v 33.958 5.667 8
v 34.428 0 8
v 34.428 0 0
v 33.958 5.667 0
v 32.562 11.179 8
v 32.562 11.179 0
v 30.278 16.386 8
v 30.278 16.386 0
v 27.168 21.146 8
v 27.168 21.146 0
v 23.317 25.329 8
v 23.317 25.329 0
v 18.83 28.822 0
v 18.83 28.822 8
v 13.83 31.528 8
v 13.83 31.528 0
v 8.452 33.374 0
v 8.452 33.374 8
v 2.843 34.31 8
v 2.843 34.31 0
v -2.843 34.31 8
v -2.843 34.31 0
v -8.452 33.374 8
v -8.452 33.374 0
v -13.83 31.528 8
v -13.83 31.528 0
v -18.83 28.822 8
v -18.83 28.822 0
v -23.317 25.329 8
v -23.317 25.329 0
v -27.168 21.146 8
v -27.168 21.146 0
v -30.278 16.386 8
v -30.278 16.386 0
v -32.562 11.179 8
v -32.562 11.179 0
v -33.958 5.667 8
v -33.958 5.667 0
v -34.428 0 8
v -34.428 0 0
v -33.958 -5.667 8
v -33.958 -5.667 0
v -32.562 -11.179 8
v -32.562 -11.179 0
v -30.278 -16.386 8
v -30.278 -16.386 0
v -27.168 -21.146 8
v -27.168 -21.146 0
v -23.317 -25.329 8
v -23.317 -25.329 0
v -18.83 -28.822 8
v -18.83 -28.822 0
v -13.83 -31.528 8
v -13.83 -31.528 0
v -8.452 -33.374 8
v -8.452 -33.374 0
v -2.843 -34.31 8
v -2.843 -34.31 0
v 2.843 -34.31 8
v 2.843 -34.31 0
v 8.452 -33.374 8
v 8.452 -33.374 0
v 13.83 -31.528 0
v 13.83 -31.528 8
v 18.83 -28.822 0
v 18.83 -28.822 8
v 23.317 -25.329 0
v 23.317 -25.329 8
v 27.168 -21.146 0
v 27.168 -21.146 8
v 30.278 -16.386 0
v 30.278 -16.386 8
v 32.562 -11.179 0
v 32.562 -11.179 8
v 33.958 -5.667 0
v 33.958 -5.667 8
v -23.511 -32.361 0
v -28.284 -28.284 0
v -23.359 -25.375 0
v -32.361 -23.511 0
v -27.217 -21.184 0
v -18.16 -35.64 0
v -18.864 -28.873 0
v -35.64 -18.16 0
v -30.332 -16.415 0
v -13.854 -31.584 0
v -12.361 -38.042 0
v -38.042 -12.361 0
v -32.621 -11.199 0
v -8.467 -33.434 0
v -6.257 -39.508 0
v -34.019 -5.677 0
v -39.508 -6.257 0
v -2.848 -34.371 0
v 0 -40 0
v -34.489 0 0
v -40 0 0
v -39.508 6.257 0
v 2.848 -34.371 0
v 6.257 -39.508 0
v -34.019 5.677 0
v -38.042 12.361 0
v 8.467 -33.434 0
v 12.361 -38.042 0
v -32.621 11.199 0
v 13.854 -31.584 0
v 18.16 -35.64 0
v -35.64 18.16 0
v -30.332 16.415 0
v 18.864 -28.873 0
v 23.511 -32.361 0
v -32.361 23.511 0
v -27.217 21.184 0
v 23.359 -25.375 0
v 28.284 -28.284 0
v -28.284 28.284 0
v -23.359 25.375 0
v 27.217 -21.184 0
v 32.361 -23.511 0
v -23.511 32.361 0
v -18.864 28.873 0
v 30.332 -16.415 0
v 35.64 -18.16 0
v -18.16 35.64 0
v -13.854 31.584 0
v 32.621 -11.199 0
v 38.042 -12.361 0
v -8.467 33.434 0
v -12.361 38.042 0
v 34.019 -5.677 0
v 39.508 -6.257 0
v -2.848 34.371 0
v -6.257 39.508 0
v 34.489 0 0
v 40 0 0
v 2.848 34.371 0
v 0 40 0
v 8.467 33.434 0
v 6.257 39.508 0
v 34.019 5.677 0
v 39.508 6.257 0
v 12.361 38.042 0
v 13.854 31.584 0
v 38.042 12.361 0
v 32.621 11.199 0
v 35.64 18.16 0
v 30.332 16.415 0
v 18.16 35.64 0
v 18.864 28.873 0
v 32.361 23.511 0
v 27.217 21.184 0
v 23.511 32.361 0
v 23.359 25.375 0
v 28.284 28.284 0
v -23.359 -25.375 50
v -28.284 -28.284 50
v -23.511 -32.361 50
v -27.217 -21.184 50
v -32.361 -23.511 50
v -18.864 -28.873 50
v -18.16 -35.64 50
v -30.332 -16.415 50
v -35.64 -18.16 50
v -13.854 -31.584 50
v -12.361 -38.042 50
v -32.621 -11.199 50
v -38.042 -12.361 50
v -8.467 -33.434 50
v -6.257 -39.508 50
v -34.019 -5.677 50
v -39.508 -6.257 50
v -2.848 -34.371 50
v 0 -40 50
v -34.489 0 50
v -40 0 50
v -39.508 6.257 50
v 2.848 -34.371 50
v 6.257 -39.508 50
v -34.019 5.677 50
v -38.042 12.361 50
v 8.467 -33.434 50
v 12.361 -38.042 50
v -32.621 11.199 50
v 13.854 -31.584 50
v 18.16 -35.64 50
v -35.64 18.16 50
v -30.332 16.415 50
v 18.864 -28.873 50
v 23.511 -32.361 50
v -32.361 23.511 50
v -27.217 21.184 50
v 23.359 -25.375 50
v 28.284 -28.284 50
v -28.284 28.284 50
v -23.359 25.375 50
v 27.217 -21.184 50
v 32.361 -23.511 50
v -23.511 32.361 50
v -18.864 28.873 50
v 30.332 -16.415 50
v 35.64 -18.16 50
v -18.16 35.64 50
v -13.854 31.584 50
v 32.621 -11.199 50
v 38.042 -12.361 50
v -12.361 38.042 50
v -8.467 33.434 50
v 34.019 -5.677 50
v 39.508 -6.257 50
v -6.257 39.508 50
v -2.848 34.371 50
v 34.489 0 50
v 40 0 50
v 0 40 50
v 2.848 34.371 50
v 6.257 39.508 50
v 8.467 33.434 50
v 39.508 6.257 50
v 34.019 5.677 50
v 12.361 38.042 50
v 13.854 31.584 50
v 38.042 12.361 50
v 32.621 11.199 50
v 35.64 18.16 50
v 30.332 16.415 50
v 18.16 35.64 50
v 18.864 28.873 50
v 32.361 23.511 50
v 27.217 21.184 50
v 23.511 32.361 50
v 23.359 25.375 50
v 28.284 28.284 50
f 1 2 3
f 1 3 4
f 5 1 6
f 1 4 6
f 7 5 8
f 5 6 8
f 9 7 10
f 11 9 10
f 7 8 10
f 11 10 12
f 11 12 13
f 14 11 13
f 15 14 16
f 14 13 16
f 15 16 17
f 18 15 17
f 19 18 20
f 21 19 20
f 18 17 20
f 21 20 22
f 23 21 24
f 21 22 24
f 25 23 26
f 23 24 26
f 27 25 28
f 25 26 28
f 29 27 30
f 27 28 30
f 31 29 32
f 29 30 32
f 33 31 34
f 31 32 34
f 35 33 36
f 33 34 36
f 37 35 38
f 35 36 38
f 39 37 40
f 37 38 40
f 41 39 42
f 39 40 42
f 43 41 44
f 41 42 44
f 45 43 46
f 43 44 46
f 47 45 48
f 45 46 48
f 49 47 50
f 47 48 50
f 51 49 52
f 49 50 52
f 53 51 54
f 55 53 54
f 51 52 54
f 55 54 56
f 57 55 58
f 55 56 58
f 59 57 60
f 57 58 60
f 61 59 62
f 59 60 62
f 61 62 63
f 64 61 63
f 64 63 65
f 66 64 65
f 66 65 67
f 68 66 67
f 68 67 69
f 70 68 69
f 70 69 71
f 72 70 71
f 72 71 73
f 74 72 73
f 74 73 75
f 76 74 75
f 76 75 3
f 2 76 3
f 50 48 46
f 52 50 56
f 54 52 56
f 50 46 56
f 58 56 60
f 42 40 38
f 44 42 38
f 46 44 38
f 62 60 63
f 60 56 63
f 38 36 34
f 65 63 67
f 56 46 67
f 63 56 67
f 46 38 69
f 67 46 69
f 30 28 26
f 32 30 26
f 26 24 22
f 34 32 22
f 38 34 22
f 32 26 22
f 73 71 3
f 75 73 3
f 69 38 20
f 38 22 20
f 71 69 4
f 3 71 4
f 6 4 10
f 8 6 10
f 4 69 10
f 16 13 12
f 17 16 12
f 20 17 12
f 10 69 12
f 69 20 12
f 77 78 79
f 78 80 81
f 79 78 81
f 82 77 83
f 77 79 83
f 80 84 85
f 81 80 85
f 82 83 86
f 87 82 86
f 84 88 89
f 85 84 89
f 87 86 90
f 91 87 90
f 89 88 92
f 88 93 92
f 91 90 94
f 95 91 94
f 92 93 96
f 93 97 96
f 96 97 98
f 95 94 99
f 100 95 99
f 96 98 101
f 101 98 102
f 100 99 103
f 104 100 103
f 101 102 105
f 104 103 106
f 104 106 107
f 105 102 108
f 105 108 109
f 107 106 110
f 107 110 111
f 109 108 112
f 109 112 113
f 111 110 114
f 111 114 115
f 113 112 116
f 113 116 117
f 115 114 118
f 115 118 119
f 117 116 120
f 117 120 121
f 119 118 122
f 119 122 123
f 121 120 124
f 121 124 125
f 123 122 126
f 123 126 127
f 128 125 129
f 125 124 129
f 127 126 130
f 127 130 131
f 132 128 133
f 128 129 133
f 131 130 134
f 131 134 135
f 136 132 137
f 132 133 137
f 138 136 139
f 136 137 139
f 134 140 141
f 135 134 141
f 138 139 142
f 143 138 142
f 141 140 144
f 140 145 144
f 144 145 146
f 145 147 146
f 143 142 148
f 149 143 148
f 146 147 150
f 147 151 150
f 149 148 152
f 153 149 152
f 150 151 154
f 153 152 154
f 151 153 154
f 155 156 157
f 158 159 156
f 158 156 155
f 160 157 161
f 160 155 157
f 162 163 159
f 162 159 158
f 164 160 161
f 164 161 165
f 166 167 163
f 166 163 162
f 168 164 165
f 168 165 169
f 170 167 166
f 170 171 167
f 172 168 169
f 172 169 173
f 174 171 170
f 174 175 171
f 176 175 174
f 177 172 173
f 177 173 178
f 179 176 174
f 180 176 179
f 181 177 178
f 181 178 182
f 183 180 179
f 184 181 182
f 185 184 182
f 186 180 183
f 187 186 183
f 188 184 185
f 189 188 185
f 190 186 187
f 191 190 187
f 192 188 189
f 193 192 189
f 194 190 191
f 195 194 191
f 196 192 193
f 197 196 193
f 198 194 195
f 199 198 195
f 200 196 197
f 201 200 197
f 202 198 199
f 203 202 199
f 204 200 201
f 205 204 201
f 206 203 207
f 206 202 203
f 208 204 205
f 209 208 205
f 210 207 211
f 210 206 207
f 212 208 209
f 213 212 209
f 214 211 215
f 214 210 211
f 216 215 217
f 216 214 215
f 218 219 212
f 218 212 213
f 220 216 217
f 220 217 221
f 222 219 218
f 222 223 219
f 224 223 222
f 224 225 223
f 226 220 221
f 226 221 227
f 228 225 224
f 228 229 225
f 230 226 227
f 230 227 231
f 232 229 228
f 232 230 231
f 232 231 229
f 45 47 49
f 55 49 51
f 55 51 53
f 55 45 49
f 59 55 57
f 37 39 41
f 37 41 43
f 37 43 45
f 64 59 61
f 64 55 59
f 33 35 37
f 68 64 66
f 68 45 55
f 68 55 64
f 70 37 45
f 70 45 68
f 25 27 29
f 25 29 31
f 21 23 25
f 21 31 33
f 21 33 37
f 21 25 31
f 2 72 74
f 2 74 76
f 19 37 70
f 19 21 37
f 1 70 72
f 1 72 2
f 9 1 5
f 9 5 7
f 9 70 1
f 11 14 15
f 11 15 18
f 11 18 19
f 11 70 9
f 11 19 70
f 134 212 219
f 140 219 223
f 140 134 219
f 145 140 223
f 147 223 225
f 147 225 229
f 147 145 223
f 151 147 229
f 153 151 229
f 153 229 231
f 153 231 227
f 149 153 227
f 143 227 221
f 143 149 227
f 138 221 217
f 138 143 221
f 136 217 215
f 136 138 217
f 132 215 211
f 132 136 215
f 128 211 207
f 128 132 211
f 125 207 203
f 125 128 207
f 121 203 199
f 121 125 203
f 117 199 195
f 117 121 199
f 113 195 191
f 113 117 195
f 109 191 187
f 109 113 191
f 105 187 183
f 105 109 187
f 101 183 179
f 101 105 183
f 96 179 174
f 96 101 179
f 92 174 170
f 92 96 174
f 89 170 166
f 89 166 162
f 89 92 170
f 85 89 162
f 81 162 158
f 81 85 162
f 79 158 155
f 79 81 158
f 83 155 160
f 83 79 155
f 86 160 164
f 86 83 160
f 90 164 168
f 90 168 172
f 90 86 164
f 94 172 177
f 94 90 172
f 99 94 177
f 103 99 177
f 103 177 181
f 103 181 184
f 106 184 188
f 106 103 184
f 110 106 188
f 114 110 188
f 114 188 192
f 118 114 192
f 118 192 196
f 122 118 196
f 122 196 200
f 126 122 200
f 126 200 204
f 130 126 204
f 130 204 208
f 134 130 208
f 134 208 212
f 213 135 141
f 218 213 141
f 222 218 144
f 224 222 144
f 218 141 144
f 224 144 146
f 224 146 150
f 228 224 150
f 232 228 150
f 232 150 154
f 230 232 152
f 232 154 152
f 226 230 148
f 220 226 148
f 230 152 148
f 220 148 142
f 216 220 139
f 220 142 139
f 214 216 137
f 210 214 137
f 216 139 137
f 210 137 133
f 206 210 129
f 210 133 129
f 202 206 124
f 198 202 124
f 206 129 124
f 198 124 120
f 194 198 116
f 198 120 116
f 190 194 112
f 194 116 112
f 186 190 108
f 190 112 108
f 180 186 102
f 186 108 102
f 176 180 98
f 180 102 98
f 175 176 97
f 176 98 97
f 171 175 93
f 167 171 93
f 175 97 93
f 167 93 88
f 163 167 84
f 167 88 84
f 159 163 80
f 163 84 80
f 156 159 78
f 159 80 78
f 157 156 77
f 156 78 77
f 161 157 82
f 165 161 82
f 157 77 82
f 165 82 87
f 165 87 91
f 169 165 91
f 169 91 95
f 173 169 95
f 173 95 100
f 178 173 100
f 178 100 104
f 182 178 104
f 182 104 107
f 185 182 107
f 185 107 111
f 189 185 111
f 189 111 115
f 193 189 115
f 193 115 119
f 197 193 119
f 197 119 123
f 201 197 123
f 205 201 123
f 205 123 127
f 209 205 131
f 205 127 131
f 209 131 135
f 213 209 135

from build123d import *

# Parameters (mm, degrees)
F0_R     = 40
F0_R_2   = 34.489253
F1_DEPTH = 50
F0_R_3   = 34.42785
F2_DEPTH = 8


with BuildPart() as f1:
    # F0 (on Top) → F1 (new body)
    with BuildSketch(Plane.XY):
        Circle(F0_R)
        Circle(F0_R_2, mode=Mode.SUBTRACT)
    extrude(amount=F1_DEPTH)


with BuildPart() as f2:
    # F0 (on Top) → F2 (new body)
    with BuildSketch(Plane.XY):
        Circle(F0_R_3)
    extrude(amount=F2_DEPTH)


solid = Compound([f1.part, f2.part])
